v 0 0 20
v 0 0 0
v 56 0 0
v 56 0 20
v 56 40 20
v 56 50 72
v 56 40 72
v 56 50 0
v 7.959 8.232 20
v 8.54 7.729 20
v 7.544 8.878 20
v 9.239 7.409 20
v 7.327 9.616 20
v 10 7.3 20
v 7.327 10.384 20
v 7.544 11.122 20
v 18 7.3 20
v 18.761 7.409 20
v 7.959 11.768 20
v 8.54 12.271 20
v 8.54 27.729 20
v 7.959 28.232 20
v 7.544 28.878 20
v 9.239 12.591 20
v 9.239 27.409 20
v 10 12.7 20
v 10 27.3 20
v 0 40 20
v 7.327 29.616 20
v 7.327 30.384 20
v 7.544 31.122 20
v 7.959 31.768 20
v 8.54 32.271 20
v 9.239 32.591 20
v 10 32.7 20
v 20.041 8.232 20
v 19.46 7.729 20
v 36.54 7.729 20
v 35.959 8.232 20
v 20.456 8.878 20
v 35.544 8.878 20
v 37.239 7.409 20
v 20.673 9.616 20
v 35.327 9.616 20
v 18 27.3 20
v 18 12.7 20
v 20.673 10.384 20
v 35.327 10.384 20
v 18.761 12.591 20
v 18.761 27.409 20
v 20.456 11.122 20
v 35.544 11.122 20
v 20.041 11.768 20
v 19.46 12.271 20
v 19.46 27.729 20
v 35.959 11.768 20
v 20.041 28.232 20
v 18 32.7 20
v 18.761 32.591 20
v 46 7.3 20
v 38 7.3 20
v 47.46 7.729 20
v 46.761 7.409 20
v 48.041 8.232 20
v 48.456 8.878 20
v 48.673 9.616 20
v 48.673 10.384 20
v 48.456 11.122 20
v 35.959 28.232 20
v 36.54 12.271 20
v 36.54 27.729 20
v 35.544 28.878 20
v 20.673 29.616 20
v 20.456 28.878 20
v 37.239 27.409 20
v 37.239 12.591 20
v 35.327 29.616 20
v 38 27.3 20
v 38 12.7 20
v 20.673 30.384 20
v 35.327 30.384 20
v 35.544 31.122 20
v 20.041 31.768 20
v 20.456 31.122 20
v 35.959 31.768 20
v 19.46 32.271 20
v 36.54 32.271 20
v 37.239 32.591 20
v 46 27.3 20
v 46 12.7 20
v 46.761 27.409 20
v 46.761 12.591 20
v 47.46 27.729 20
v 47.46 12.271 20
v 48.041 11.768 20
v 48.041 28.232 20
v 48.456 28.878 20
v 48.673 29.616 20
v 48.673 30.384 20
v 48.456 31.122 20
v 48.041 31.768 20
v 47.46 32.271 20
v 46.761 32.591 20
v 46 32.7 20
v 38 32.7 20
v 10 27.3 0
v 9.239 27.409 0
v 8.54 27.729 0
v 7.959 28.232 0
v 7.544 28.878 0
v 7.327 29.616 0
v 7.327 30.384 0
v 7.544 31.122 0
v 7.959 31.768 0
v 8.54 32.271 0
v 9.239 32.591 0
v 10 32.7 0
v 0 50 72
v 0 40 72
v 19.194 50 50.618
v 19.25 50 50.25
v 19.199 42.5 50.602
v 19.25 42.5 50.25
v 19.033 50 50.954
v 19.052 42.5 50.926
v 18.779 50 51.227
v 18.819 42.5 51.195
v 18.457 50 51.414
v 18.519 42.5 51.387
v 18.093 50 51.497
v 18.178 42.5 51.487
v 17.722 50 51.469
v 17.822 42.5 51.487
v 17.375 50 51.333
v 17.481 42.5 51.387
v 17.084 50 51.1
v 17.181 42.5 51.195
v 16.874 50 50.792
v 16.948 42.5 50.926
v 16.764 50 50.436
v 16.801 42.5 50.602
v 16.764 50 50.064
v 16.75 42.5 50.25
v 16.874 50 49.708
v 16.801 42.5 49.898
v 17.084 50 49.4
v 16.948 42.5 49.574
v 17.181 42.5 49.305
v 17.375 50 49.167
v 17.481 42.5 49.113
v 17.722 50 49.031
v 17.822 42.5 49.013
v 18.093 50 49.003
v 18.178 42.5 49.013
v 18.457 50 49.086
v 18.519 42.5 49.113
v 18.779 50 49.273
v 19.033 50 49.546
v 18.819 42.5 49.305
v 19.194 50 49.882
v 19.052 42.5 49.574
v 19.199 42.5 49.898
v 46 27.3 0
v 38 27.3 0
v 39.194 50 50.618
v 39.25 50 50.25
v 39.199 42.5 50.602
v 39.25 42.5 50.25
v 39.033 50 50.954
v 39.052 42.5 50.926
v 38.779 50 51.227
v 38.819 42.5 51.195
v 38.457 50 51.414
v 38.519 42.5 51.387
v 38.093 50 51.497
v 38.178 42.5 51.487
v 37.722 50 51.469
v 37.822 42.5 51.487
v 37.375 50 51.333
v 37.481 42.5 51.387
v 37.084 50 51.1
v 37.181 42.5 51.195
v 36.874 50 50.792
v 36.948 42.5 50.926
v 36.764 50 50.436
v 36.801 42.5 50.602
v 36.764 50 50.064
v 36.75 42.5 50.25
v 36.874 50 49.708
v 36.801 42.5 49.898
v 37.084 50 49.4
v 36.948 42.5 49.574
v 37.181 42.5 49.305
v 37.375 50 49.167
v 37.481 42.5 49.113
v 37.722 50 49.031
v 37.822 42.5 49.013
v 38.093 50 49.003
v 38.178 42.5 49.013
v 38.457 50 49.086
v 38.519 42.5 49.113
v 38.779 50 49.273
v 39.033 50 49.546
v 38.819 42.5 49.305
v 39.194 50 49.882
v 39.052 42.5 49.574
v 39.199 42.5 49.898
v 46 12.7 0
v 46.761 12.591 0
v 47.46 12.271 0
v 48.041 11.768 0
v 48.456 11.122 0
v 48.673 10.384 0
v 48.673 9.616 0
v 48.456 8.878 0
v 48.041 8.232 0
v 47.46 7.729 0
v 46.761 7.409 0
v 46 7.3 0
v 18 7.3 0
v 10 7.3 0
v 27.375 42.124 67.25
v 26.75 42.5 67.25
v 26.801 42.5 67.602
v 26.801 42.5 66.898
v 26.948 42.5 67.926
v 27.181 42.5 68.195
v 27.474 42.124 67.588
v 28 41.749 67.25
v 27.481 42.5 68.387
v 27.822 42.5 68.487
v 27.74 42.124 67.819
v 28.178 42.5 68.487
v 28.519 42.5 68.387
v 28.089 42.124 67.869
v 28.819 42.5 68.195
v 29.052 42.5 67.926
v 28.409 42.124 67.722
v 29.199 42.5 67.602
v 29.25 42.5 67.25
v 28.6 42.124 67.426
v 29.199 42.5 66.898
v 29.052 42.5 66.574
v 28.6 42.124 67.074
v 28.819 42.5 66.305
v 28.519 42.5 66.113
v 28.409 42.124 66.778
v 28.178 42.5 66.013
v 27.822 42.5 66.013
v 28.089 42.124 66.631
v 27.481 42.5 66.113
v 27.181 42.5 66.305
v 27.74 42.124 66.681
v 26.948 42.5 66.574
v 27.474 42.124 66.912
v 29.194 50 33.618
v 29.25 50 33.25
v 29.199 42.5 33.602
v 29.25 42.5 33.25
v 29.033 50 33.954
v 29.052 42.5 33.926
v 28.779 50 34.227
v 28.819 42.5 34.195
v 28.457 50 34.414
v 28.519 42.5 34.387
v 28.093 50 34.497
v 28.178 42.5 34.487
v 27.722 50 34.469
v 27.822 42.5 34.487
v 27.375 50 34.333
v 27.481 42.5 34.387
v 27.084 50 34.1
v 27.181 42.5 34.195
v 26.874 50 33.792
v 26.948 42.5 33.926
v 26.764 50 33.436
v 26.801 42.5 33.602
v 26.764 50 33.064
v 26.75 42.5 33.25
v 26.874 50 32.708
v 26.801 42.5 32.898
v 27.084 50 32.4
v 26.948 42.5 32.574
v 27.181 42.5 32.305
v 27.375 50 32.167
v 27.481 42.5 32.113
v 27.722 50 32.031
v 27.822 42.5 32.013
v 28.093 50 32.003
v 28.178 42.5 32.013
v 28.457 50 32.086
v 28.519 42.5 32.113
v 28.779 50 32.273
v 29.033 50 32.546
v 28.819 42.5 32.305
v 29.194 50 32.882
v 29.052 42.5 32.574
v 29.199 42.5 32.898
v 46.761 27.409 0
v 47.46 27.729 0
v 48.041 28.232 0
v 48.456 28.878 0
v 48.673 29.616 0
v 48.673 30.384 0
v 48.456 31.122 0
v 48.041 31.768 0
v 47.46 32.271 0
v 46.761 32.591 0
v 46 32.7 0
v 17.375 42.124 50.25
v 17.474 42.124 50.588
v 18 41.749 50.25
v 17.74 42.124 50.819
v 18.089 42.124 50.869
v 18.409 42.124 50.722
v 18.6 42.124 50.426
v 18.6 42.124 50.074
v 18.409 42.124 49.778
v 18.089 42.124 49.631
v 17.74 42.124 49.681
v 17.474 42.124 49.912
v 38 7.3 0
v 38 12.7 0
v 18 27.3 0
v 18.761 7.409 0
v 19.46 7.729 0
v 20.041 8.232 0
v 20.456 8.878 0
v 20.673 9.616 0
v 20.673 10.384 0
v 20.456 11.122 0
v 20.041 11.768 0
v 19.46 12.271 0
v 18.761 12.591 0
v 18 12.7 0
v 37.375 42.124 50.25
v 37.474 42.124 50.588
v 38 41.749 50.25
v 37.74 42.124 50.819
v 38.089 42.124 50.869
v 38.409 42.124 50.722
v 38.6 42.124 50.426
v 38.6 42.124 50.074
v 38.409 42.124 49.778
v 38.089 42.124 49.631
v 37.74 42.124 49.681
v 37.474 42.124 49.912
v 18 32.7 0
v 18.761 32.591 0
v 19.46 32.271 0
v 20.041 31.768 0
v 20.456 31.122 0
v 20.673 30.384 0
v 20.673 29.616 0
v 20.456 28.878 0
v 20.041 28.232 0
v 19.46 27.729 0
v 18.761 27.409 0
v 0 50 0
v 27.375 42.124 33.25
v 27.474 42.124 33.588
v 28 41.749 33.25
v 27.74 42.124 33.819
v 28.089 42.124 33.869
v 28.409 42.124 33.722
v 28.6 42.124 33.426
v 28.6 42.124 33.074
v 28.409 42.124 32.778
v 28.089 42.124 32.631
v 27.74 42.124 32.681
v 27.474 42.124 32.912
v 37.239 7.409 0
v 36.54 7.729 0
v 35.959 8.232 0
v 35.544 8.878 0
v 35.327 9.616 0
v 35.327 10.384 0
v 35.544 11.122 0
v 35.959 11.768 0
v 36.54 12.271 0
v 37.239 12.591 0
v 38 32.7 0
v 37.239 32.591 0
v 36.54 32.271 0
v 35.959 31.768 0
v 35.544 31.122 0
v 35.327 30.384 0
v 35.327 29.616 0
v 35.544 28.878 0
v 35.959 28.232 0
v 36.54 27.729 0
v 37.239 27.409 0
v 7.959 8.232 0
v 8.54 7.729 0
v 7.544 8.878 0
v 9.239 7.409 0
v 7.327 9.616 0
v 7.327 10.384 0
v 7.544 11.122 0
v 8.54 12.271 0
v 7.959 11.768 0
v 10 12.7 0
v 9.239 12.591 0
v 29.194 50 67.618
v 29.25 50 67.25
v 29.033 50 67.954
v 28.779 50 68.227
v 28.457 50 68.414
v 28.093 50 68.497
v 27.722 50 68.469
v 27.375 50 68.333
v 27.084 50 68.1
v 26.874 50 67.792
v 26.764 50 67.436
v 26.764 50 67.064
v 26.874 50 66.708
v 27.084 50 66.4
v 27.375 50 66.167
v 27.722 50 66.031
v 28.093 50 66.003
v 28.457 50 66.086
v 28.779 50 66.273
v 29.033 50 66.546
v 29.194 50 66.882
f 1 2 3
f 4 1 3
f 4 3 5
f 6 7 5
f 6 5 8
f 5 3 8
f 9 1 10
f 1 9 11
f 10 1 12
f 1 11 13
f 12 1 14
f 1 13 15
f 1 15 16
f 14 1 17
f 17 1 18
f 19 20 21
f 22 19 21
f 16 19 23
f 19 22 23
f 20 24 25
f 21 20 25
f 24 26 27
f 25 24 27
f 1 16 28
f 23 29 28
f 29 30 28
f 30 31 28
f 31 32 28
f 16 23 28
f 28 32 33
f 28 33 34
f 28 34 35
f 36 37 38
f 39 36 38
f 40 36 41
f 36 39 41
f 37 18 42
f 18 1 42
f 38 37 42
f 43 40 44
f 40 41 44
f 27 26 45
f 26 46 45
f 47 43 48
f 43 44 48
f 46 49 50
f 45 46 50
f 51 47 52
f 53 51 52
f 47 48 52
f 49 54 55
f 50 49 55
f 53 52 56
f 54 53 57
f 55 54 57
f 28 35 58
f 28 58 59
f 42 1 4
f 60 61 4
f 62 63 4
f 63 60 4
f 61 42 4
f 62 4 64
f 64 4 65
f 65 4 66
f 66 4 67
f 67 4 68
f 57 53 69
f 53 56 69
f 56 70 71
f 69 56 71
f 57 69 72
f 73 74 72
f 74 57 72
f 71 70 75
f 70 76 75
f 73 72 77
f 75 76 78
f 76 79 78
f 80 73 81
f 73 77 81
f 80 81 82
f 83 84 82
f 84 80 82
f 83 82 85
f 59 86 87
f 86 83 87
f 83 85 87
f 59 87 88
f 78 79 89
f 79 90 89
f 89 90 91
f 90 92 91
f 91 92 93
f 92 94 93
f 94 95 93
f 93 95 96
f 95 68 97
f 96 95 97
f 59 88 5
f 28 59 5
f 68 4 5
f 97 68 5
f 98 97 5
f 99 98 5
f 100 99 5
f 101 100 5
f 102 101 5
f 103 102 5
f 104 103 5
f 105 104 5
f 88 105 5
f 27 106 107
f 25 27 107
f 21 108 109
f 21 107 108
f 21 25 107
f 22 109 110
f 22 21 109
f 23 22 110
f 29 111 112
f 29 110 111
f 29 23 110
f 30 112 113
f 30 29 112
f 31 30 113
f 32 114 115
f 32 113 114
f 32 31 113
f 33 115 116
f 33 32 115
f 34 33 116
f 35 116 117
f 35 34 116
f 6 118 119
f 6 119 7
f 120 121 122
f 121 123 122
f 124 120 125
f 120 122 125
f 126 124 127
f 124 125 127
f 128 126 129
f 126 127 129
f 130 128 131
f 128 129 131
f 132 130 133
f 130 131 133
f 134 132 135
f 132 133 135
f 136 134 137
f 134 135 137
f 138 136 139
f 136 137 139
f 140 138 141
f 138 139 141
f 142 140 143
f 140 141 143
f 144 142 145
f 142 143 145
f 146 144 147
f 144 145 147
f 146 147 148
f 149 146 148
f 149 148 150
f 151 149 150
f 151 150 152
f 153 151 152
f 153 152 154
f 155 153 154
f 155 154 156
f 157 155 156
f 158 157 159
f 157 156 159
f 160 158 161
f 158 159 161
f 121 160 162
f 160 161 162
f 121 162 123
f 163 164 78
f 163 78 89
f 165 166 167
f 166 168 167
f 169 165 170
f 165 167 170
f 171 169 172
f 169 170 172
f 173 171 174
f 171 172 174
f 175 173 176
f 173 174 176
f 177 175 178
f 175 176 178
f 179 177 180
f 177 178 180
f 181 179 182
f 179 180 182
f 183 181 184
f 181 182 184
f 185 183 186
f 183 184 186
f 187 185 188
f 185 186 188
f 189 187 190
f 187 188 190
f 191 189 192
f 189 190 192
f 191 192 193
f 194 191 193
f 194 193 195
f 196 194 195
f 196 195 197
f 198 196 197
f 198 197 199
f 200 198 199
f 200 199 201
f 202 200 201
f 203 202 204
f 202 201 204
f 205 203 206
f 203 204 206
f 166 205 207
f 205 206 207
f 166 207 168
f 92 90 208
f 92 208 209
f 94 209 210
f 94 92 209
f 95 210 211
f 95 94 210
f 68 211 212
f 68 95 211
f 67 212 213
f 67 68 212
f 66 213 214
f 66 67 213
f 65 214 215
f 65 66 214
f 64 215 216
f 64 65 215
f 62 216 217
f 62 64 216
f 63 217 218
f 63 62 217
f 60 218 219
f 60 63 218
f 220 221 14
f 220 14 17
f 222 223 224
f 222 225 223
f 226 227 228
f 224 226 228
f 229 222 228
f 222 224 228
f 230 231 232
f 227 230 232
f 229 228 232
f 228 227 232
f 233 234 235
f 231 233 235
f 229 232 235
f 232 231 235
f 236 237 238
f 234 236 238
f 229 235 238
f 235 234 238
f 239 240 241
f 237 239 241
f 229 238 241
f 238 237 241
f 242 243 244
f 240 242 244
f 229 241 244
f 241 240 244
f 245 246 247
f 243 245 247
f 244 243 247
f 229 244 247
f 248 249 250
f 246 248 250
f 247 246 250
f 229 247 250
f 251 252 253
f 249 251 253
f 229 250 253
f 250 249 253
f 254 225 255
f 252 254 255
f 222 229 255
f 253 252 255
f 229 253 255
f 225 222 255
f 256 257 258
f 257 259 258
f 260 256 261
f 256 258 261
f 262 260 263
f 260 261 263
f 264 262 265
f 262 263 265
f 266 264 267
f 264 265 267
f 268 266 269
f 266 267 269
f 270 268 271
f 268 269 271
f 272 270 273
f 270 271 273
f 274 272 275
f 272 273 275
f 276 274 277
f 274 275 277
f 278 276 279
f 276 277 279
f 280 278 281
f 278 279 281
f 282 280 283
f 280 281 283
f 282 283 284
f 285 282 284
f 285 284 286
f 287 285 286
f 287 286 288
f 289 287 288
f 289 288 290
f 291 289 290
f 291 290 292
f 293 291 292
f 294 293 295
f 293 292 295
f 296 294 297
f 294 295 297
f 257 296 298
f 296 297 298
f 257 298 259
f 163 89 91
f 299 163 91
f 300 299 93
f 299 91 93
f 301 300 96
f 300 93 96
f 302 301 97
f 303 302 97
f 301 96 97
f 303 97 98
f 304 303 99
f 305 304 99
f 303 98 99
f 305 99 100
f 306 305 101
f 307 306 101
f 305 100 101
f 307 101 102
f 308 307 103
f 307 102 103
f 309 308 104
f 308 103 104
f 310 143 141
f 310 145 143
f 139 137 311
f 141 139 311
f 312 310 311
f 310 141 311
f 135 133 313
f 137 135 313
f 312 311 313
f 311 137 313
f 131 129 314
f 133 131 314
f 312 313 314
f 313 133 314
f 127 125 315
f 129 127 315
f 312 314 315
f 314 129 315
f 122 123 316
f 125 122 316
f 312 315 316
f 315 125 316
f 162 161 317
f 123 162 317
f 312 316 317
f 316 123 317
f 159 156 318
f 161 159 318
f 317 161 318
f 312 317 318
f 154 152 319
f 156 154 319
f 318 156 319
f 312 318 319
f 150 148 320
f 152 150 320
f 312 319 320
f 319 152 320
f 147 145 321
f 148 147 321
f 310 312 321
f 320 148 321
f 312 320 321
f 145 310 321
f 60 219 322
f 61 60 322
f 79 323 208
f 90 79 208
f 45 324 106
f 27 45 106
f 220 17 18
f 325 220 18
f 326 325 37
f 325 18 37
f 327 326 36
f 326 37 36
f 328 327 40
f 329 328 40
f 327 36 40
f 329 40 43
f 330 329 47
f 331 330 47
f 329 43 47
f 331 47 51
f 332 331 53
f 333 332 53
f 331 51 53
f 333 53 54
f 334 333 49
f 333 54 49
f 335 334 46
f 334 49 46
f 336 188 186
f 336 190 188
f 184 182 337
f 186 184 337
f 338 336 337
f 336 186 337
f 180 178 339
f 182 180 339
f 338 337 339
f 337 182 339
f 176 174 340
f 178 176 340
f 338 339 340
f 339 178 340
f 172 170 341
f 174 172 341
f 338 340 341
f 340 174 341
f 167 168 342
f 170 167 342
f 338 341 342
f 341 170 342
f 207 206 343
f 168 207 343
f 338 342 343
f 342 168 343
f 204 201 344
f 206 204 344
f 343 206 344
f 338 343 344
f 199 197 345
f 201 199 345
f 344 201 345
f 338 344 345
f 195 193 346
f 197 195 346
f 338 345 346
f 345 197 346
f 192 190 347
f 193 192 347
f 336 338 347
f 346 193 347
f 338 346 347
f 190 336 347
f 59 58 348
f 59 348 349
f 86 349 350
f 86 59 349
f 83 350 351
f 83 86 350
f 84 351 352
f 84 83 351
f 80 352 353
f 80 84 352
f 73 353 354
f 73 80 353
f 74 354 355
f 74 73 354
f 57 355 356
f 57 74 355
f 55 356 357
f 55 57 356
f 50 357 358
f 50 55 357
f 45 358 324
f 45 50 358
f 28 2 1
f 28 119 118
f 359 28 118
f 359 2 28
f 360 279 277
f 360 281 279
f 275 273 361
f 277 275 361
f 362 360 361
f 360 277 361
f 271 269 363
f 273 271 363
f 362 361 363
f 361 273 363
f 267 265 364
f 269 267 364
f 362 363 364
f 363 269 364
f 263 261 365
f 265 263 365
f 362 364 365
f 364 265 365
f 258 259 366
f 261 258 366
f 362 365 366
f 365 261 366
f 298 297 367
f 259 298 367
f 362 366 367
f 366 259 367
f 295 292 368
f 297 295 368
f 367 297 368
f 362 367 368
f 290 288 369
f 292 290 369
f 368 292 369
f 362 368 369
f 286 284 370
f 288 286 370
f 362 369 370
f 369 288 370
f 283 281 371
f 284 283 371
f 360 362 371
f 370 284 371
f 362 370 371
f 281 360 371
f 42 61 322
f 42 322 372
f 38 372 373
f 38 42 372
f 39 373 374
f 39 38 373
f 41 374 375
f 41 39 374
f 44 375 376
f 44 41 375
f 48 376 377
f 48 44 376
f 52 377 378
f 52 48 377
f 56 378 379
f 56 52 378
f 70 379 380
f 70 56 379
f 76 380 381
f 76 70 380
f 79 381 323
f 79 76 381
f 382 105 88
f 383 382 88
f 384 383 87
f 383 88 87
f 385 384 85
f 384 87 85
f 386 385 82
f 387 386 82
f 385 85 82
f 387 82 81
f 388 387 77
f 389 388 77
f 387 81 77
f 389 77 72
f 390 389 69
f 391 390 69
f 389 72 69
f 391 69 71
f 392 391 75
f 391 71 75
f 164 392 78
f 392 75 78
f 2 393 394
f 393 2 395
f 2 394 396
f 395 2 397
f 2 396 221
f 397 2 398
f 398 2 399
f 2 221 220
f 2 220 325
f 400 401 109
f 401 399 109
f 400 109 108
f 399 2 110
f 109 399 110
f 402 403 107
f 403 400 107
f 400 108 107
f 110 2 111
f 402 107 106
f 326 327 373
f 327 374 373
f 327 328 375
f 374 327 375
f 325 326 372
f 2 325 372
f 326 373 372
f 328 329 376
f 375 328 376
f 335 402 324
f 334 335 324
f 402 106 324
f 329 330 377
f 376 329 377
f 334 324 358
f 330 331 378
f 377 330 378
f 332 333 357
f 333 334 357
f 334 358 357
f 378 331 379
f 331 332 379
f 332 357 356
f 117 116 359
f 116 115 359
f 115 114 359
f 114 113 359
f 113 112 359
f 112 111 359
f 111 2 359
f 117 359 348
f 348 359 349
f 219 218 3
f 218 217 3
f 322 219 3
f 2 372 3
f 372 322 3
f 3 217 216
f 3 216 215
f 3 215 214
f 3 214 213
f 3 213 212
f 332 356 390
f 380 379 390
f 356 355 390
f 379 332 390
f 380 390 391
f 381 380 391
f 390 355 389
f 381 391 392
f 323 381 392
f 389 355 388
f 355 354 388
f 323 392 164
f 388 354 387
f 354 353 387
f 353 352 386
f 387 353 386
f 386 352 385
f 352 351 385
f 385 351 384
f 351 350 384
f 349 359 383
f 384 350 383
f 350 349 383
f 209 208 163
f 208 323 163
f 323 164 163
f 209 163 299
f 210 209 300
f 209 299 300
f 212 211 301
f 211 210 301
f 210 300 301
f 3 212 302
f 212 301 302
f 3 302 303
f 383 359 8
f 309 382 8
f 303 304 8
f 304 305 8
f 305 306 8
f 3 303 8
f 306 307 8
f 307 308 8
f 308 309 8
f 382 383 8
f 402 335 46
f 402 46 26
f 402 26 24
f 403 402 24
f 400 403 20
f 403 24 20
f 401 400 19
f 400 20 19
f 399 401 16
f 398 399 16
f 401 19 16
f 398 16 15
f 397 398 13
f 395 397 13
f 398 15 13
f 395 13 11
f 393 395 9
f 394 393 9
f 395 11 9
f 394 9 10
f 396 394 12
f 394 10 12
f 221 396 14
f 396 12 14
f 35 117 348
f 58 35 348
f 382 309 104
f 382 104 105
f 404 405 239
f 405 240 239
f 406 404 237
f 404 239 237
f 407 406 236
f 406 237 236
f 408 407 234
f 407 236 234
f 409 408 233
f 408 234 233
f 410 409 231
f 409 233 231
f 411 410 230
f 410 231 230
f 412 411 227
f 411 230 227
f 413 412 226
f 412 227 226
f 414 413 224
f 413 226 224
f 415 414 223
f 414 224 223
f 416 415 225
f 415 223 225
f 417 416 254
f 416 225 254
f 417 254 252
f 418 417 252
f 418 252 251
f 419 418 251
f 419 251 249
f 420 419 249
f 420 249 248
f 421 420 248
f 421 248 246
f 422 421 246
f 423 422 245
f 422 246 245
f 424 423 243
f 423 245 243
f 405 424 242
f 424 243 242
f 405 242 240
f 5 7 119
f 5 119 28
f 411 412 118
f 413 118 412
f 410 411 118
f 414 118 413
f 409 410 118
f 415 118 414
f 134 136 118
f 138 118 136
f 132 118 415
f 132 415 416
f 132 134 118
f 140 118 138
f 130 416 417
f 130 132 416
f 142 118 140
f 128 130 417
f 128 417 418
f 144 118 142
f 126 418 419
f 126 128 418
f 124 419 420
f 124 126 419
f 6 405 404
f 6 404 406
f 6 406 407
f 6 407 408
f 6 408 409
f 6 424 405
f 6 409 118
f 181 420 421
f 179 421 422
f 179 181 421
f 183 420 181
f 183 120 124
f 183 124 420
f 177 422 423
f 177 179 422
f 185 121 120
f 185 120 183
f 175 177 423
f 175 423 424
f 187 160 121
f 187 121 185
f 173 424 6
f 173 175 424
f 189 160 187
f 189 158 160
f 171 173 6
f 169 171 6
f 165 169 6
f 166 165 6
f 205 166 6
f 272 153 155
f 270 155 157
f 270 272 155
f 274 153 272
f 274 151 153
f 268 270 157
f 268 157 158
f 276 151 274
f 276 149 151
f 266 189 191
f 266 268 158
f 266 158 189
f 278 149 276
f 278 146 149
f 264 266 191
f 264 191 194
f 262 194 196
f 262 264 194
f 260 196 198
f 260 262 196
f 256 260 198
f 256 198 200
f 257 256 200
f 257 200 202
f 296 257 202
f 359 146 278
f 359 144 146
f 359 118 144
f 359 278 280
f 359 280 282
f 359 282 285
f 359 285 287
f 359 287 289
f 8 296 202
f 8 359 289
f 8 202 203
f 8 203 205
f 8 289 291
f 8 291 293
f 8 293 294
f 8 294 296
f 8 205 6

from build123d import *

# Parameters (mm, degrees)
SKETCH_1_W             = 56
SKETCH_1_H             = 50
EXTRUDE_1_DEPTH        = 72
SKETCH_2_W             = 52
SKETCH_2_H             = 40
CUT_EXTRUDE_1_DEPTH    = 105.019228992
HOLE_WIZARD_M3_1_D     = 2.5
HOLE_WIZARD_M3_1_DEPTH = 7.5
HOLE_WIZARD_M3_1_TIP   = 0.751075774
CUT_EXTRUDE_2_DEPTH    = 92.323600455


with BuildPart() as part:
    # 草图1 → 凸台-拉伸1 (new body)
    with BuildSketch(Plane.XY):
        with Locations((28, 25)):
            Rectangle(SKETCH_1_W, SKETCH_1_H)
    extrude(amount=EXTRUDE_1_DEPTH)

    # 草图2 → 切除-拉伸1 (cut, through all)
    with BuildSketch(Plane(origin=(56, 0, 0), x_dir=(0, 0, -1), z_dir=(1, 0, 0))):
        with Locations((-46, 20)):
            Rectangle(SKETCH_2_W, SKETCH_2_H)
    extrude(amount=-CUT_EXTRUDE_1_DEPTH, mode=Mode.SUBTRACT)

    # M3 螺纹孔1
    with Locations(Plane(origin=(0, 50, 0), x_dir=(-1, 0, 0), z_dir=(0, 1, 0))):
        with Locations((-28, 67.25), (-28, 33.25), (-18, 50.25), (-38, 50.25)):
            Hole(HOLE_WIZARD_M3_1_D / 2, depth=HOLE_WIZARD_M3_1_DEPTH)
            with Locations((0, 0, -(HOLE_WIZARD_M3_1_DEPTH + HOLE_WIZARD_M3_1_TIP / 2))):  # 118° drill point
                Cone(0, HOLE_WIZARD_M3_1_D / 2, HOLE_WIZARD_M3_1_TIP, mode=Mode.SUBTRACT)

    # 草图5 → 切除-拉伸2 (cut, through all)
    with BuildSketch(Plane.XY.offset(20)):
        with BuildLine():
            Line((10, 32.7), (18, 32.7))
            ThreePointArc((18, 32.7), (20.7, 30), (18, 27.3))
            Line((18, 27.3), (10, 27.3))
            ThreePointArc((10, 27.3), (7.3, 30), (10, 32.7))
        make_face()
        with BuildLine():
            Line((46, 32.7), (38, 32.7))
            ThreePointArc((38, 32.7), (35.3, 30), (38, 27.3))
            Line((38, 27.3), (46, 27.3))
            ThreePointArc((46, 27.3), (48.7, 30), (46, 32.7))
        make_face()
        with BuildLine():
            Line((10, 7.3), (18, 7.3))
            ThreePointArc((18, 7.3), (20.7, 10), (18, 12.7))
            Line((18, 12.7), (10, 12.7))
            ThreePointArc((10, 12.7), (7.3, 10), (10, 7.3))
        make_face()
        with BuildLine():
            Line((46, 7.3), (38, 7.3))
            ThreePointArc((38, 7.3), (35.3, 10), (38, 12.7))
            Line((38, 12.7), (46, 12.7))
            ThreePointArc((46, 12.7), (48.7, 10), (46, 7.3))
        make_face()
    extrude(amount=-CUT_EXTRUDE_2_DEPTH, mode=Mode.SUBTRACT)


solid = part.part
